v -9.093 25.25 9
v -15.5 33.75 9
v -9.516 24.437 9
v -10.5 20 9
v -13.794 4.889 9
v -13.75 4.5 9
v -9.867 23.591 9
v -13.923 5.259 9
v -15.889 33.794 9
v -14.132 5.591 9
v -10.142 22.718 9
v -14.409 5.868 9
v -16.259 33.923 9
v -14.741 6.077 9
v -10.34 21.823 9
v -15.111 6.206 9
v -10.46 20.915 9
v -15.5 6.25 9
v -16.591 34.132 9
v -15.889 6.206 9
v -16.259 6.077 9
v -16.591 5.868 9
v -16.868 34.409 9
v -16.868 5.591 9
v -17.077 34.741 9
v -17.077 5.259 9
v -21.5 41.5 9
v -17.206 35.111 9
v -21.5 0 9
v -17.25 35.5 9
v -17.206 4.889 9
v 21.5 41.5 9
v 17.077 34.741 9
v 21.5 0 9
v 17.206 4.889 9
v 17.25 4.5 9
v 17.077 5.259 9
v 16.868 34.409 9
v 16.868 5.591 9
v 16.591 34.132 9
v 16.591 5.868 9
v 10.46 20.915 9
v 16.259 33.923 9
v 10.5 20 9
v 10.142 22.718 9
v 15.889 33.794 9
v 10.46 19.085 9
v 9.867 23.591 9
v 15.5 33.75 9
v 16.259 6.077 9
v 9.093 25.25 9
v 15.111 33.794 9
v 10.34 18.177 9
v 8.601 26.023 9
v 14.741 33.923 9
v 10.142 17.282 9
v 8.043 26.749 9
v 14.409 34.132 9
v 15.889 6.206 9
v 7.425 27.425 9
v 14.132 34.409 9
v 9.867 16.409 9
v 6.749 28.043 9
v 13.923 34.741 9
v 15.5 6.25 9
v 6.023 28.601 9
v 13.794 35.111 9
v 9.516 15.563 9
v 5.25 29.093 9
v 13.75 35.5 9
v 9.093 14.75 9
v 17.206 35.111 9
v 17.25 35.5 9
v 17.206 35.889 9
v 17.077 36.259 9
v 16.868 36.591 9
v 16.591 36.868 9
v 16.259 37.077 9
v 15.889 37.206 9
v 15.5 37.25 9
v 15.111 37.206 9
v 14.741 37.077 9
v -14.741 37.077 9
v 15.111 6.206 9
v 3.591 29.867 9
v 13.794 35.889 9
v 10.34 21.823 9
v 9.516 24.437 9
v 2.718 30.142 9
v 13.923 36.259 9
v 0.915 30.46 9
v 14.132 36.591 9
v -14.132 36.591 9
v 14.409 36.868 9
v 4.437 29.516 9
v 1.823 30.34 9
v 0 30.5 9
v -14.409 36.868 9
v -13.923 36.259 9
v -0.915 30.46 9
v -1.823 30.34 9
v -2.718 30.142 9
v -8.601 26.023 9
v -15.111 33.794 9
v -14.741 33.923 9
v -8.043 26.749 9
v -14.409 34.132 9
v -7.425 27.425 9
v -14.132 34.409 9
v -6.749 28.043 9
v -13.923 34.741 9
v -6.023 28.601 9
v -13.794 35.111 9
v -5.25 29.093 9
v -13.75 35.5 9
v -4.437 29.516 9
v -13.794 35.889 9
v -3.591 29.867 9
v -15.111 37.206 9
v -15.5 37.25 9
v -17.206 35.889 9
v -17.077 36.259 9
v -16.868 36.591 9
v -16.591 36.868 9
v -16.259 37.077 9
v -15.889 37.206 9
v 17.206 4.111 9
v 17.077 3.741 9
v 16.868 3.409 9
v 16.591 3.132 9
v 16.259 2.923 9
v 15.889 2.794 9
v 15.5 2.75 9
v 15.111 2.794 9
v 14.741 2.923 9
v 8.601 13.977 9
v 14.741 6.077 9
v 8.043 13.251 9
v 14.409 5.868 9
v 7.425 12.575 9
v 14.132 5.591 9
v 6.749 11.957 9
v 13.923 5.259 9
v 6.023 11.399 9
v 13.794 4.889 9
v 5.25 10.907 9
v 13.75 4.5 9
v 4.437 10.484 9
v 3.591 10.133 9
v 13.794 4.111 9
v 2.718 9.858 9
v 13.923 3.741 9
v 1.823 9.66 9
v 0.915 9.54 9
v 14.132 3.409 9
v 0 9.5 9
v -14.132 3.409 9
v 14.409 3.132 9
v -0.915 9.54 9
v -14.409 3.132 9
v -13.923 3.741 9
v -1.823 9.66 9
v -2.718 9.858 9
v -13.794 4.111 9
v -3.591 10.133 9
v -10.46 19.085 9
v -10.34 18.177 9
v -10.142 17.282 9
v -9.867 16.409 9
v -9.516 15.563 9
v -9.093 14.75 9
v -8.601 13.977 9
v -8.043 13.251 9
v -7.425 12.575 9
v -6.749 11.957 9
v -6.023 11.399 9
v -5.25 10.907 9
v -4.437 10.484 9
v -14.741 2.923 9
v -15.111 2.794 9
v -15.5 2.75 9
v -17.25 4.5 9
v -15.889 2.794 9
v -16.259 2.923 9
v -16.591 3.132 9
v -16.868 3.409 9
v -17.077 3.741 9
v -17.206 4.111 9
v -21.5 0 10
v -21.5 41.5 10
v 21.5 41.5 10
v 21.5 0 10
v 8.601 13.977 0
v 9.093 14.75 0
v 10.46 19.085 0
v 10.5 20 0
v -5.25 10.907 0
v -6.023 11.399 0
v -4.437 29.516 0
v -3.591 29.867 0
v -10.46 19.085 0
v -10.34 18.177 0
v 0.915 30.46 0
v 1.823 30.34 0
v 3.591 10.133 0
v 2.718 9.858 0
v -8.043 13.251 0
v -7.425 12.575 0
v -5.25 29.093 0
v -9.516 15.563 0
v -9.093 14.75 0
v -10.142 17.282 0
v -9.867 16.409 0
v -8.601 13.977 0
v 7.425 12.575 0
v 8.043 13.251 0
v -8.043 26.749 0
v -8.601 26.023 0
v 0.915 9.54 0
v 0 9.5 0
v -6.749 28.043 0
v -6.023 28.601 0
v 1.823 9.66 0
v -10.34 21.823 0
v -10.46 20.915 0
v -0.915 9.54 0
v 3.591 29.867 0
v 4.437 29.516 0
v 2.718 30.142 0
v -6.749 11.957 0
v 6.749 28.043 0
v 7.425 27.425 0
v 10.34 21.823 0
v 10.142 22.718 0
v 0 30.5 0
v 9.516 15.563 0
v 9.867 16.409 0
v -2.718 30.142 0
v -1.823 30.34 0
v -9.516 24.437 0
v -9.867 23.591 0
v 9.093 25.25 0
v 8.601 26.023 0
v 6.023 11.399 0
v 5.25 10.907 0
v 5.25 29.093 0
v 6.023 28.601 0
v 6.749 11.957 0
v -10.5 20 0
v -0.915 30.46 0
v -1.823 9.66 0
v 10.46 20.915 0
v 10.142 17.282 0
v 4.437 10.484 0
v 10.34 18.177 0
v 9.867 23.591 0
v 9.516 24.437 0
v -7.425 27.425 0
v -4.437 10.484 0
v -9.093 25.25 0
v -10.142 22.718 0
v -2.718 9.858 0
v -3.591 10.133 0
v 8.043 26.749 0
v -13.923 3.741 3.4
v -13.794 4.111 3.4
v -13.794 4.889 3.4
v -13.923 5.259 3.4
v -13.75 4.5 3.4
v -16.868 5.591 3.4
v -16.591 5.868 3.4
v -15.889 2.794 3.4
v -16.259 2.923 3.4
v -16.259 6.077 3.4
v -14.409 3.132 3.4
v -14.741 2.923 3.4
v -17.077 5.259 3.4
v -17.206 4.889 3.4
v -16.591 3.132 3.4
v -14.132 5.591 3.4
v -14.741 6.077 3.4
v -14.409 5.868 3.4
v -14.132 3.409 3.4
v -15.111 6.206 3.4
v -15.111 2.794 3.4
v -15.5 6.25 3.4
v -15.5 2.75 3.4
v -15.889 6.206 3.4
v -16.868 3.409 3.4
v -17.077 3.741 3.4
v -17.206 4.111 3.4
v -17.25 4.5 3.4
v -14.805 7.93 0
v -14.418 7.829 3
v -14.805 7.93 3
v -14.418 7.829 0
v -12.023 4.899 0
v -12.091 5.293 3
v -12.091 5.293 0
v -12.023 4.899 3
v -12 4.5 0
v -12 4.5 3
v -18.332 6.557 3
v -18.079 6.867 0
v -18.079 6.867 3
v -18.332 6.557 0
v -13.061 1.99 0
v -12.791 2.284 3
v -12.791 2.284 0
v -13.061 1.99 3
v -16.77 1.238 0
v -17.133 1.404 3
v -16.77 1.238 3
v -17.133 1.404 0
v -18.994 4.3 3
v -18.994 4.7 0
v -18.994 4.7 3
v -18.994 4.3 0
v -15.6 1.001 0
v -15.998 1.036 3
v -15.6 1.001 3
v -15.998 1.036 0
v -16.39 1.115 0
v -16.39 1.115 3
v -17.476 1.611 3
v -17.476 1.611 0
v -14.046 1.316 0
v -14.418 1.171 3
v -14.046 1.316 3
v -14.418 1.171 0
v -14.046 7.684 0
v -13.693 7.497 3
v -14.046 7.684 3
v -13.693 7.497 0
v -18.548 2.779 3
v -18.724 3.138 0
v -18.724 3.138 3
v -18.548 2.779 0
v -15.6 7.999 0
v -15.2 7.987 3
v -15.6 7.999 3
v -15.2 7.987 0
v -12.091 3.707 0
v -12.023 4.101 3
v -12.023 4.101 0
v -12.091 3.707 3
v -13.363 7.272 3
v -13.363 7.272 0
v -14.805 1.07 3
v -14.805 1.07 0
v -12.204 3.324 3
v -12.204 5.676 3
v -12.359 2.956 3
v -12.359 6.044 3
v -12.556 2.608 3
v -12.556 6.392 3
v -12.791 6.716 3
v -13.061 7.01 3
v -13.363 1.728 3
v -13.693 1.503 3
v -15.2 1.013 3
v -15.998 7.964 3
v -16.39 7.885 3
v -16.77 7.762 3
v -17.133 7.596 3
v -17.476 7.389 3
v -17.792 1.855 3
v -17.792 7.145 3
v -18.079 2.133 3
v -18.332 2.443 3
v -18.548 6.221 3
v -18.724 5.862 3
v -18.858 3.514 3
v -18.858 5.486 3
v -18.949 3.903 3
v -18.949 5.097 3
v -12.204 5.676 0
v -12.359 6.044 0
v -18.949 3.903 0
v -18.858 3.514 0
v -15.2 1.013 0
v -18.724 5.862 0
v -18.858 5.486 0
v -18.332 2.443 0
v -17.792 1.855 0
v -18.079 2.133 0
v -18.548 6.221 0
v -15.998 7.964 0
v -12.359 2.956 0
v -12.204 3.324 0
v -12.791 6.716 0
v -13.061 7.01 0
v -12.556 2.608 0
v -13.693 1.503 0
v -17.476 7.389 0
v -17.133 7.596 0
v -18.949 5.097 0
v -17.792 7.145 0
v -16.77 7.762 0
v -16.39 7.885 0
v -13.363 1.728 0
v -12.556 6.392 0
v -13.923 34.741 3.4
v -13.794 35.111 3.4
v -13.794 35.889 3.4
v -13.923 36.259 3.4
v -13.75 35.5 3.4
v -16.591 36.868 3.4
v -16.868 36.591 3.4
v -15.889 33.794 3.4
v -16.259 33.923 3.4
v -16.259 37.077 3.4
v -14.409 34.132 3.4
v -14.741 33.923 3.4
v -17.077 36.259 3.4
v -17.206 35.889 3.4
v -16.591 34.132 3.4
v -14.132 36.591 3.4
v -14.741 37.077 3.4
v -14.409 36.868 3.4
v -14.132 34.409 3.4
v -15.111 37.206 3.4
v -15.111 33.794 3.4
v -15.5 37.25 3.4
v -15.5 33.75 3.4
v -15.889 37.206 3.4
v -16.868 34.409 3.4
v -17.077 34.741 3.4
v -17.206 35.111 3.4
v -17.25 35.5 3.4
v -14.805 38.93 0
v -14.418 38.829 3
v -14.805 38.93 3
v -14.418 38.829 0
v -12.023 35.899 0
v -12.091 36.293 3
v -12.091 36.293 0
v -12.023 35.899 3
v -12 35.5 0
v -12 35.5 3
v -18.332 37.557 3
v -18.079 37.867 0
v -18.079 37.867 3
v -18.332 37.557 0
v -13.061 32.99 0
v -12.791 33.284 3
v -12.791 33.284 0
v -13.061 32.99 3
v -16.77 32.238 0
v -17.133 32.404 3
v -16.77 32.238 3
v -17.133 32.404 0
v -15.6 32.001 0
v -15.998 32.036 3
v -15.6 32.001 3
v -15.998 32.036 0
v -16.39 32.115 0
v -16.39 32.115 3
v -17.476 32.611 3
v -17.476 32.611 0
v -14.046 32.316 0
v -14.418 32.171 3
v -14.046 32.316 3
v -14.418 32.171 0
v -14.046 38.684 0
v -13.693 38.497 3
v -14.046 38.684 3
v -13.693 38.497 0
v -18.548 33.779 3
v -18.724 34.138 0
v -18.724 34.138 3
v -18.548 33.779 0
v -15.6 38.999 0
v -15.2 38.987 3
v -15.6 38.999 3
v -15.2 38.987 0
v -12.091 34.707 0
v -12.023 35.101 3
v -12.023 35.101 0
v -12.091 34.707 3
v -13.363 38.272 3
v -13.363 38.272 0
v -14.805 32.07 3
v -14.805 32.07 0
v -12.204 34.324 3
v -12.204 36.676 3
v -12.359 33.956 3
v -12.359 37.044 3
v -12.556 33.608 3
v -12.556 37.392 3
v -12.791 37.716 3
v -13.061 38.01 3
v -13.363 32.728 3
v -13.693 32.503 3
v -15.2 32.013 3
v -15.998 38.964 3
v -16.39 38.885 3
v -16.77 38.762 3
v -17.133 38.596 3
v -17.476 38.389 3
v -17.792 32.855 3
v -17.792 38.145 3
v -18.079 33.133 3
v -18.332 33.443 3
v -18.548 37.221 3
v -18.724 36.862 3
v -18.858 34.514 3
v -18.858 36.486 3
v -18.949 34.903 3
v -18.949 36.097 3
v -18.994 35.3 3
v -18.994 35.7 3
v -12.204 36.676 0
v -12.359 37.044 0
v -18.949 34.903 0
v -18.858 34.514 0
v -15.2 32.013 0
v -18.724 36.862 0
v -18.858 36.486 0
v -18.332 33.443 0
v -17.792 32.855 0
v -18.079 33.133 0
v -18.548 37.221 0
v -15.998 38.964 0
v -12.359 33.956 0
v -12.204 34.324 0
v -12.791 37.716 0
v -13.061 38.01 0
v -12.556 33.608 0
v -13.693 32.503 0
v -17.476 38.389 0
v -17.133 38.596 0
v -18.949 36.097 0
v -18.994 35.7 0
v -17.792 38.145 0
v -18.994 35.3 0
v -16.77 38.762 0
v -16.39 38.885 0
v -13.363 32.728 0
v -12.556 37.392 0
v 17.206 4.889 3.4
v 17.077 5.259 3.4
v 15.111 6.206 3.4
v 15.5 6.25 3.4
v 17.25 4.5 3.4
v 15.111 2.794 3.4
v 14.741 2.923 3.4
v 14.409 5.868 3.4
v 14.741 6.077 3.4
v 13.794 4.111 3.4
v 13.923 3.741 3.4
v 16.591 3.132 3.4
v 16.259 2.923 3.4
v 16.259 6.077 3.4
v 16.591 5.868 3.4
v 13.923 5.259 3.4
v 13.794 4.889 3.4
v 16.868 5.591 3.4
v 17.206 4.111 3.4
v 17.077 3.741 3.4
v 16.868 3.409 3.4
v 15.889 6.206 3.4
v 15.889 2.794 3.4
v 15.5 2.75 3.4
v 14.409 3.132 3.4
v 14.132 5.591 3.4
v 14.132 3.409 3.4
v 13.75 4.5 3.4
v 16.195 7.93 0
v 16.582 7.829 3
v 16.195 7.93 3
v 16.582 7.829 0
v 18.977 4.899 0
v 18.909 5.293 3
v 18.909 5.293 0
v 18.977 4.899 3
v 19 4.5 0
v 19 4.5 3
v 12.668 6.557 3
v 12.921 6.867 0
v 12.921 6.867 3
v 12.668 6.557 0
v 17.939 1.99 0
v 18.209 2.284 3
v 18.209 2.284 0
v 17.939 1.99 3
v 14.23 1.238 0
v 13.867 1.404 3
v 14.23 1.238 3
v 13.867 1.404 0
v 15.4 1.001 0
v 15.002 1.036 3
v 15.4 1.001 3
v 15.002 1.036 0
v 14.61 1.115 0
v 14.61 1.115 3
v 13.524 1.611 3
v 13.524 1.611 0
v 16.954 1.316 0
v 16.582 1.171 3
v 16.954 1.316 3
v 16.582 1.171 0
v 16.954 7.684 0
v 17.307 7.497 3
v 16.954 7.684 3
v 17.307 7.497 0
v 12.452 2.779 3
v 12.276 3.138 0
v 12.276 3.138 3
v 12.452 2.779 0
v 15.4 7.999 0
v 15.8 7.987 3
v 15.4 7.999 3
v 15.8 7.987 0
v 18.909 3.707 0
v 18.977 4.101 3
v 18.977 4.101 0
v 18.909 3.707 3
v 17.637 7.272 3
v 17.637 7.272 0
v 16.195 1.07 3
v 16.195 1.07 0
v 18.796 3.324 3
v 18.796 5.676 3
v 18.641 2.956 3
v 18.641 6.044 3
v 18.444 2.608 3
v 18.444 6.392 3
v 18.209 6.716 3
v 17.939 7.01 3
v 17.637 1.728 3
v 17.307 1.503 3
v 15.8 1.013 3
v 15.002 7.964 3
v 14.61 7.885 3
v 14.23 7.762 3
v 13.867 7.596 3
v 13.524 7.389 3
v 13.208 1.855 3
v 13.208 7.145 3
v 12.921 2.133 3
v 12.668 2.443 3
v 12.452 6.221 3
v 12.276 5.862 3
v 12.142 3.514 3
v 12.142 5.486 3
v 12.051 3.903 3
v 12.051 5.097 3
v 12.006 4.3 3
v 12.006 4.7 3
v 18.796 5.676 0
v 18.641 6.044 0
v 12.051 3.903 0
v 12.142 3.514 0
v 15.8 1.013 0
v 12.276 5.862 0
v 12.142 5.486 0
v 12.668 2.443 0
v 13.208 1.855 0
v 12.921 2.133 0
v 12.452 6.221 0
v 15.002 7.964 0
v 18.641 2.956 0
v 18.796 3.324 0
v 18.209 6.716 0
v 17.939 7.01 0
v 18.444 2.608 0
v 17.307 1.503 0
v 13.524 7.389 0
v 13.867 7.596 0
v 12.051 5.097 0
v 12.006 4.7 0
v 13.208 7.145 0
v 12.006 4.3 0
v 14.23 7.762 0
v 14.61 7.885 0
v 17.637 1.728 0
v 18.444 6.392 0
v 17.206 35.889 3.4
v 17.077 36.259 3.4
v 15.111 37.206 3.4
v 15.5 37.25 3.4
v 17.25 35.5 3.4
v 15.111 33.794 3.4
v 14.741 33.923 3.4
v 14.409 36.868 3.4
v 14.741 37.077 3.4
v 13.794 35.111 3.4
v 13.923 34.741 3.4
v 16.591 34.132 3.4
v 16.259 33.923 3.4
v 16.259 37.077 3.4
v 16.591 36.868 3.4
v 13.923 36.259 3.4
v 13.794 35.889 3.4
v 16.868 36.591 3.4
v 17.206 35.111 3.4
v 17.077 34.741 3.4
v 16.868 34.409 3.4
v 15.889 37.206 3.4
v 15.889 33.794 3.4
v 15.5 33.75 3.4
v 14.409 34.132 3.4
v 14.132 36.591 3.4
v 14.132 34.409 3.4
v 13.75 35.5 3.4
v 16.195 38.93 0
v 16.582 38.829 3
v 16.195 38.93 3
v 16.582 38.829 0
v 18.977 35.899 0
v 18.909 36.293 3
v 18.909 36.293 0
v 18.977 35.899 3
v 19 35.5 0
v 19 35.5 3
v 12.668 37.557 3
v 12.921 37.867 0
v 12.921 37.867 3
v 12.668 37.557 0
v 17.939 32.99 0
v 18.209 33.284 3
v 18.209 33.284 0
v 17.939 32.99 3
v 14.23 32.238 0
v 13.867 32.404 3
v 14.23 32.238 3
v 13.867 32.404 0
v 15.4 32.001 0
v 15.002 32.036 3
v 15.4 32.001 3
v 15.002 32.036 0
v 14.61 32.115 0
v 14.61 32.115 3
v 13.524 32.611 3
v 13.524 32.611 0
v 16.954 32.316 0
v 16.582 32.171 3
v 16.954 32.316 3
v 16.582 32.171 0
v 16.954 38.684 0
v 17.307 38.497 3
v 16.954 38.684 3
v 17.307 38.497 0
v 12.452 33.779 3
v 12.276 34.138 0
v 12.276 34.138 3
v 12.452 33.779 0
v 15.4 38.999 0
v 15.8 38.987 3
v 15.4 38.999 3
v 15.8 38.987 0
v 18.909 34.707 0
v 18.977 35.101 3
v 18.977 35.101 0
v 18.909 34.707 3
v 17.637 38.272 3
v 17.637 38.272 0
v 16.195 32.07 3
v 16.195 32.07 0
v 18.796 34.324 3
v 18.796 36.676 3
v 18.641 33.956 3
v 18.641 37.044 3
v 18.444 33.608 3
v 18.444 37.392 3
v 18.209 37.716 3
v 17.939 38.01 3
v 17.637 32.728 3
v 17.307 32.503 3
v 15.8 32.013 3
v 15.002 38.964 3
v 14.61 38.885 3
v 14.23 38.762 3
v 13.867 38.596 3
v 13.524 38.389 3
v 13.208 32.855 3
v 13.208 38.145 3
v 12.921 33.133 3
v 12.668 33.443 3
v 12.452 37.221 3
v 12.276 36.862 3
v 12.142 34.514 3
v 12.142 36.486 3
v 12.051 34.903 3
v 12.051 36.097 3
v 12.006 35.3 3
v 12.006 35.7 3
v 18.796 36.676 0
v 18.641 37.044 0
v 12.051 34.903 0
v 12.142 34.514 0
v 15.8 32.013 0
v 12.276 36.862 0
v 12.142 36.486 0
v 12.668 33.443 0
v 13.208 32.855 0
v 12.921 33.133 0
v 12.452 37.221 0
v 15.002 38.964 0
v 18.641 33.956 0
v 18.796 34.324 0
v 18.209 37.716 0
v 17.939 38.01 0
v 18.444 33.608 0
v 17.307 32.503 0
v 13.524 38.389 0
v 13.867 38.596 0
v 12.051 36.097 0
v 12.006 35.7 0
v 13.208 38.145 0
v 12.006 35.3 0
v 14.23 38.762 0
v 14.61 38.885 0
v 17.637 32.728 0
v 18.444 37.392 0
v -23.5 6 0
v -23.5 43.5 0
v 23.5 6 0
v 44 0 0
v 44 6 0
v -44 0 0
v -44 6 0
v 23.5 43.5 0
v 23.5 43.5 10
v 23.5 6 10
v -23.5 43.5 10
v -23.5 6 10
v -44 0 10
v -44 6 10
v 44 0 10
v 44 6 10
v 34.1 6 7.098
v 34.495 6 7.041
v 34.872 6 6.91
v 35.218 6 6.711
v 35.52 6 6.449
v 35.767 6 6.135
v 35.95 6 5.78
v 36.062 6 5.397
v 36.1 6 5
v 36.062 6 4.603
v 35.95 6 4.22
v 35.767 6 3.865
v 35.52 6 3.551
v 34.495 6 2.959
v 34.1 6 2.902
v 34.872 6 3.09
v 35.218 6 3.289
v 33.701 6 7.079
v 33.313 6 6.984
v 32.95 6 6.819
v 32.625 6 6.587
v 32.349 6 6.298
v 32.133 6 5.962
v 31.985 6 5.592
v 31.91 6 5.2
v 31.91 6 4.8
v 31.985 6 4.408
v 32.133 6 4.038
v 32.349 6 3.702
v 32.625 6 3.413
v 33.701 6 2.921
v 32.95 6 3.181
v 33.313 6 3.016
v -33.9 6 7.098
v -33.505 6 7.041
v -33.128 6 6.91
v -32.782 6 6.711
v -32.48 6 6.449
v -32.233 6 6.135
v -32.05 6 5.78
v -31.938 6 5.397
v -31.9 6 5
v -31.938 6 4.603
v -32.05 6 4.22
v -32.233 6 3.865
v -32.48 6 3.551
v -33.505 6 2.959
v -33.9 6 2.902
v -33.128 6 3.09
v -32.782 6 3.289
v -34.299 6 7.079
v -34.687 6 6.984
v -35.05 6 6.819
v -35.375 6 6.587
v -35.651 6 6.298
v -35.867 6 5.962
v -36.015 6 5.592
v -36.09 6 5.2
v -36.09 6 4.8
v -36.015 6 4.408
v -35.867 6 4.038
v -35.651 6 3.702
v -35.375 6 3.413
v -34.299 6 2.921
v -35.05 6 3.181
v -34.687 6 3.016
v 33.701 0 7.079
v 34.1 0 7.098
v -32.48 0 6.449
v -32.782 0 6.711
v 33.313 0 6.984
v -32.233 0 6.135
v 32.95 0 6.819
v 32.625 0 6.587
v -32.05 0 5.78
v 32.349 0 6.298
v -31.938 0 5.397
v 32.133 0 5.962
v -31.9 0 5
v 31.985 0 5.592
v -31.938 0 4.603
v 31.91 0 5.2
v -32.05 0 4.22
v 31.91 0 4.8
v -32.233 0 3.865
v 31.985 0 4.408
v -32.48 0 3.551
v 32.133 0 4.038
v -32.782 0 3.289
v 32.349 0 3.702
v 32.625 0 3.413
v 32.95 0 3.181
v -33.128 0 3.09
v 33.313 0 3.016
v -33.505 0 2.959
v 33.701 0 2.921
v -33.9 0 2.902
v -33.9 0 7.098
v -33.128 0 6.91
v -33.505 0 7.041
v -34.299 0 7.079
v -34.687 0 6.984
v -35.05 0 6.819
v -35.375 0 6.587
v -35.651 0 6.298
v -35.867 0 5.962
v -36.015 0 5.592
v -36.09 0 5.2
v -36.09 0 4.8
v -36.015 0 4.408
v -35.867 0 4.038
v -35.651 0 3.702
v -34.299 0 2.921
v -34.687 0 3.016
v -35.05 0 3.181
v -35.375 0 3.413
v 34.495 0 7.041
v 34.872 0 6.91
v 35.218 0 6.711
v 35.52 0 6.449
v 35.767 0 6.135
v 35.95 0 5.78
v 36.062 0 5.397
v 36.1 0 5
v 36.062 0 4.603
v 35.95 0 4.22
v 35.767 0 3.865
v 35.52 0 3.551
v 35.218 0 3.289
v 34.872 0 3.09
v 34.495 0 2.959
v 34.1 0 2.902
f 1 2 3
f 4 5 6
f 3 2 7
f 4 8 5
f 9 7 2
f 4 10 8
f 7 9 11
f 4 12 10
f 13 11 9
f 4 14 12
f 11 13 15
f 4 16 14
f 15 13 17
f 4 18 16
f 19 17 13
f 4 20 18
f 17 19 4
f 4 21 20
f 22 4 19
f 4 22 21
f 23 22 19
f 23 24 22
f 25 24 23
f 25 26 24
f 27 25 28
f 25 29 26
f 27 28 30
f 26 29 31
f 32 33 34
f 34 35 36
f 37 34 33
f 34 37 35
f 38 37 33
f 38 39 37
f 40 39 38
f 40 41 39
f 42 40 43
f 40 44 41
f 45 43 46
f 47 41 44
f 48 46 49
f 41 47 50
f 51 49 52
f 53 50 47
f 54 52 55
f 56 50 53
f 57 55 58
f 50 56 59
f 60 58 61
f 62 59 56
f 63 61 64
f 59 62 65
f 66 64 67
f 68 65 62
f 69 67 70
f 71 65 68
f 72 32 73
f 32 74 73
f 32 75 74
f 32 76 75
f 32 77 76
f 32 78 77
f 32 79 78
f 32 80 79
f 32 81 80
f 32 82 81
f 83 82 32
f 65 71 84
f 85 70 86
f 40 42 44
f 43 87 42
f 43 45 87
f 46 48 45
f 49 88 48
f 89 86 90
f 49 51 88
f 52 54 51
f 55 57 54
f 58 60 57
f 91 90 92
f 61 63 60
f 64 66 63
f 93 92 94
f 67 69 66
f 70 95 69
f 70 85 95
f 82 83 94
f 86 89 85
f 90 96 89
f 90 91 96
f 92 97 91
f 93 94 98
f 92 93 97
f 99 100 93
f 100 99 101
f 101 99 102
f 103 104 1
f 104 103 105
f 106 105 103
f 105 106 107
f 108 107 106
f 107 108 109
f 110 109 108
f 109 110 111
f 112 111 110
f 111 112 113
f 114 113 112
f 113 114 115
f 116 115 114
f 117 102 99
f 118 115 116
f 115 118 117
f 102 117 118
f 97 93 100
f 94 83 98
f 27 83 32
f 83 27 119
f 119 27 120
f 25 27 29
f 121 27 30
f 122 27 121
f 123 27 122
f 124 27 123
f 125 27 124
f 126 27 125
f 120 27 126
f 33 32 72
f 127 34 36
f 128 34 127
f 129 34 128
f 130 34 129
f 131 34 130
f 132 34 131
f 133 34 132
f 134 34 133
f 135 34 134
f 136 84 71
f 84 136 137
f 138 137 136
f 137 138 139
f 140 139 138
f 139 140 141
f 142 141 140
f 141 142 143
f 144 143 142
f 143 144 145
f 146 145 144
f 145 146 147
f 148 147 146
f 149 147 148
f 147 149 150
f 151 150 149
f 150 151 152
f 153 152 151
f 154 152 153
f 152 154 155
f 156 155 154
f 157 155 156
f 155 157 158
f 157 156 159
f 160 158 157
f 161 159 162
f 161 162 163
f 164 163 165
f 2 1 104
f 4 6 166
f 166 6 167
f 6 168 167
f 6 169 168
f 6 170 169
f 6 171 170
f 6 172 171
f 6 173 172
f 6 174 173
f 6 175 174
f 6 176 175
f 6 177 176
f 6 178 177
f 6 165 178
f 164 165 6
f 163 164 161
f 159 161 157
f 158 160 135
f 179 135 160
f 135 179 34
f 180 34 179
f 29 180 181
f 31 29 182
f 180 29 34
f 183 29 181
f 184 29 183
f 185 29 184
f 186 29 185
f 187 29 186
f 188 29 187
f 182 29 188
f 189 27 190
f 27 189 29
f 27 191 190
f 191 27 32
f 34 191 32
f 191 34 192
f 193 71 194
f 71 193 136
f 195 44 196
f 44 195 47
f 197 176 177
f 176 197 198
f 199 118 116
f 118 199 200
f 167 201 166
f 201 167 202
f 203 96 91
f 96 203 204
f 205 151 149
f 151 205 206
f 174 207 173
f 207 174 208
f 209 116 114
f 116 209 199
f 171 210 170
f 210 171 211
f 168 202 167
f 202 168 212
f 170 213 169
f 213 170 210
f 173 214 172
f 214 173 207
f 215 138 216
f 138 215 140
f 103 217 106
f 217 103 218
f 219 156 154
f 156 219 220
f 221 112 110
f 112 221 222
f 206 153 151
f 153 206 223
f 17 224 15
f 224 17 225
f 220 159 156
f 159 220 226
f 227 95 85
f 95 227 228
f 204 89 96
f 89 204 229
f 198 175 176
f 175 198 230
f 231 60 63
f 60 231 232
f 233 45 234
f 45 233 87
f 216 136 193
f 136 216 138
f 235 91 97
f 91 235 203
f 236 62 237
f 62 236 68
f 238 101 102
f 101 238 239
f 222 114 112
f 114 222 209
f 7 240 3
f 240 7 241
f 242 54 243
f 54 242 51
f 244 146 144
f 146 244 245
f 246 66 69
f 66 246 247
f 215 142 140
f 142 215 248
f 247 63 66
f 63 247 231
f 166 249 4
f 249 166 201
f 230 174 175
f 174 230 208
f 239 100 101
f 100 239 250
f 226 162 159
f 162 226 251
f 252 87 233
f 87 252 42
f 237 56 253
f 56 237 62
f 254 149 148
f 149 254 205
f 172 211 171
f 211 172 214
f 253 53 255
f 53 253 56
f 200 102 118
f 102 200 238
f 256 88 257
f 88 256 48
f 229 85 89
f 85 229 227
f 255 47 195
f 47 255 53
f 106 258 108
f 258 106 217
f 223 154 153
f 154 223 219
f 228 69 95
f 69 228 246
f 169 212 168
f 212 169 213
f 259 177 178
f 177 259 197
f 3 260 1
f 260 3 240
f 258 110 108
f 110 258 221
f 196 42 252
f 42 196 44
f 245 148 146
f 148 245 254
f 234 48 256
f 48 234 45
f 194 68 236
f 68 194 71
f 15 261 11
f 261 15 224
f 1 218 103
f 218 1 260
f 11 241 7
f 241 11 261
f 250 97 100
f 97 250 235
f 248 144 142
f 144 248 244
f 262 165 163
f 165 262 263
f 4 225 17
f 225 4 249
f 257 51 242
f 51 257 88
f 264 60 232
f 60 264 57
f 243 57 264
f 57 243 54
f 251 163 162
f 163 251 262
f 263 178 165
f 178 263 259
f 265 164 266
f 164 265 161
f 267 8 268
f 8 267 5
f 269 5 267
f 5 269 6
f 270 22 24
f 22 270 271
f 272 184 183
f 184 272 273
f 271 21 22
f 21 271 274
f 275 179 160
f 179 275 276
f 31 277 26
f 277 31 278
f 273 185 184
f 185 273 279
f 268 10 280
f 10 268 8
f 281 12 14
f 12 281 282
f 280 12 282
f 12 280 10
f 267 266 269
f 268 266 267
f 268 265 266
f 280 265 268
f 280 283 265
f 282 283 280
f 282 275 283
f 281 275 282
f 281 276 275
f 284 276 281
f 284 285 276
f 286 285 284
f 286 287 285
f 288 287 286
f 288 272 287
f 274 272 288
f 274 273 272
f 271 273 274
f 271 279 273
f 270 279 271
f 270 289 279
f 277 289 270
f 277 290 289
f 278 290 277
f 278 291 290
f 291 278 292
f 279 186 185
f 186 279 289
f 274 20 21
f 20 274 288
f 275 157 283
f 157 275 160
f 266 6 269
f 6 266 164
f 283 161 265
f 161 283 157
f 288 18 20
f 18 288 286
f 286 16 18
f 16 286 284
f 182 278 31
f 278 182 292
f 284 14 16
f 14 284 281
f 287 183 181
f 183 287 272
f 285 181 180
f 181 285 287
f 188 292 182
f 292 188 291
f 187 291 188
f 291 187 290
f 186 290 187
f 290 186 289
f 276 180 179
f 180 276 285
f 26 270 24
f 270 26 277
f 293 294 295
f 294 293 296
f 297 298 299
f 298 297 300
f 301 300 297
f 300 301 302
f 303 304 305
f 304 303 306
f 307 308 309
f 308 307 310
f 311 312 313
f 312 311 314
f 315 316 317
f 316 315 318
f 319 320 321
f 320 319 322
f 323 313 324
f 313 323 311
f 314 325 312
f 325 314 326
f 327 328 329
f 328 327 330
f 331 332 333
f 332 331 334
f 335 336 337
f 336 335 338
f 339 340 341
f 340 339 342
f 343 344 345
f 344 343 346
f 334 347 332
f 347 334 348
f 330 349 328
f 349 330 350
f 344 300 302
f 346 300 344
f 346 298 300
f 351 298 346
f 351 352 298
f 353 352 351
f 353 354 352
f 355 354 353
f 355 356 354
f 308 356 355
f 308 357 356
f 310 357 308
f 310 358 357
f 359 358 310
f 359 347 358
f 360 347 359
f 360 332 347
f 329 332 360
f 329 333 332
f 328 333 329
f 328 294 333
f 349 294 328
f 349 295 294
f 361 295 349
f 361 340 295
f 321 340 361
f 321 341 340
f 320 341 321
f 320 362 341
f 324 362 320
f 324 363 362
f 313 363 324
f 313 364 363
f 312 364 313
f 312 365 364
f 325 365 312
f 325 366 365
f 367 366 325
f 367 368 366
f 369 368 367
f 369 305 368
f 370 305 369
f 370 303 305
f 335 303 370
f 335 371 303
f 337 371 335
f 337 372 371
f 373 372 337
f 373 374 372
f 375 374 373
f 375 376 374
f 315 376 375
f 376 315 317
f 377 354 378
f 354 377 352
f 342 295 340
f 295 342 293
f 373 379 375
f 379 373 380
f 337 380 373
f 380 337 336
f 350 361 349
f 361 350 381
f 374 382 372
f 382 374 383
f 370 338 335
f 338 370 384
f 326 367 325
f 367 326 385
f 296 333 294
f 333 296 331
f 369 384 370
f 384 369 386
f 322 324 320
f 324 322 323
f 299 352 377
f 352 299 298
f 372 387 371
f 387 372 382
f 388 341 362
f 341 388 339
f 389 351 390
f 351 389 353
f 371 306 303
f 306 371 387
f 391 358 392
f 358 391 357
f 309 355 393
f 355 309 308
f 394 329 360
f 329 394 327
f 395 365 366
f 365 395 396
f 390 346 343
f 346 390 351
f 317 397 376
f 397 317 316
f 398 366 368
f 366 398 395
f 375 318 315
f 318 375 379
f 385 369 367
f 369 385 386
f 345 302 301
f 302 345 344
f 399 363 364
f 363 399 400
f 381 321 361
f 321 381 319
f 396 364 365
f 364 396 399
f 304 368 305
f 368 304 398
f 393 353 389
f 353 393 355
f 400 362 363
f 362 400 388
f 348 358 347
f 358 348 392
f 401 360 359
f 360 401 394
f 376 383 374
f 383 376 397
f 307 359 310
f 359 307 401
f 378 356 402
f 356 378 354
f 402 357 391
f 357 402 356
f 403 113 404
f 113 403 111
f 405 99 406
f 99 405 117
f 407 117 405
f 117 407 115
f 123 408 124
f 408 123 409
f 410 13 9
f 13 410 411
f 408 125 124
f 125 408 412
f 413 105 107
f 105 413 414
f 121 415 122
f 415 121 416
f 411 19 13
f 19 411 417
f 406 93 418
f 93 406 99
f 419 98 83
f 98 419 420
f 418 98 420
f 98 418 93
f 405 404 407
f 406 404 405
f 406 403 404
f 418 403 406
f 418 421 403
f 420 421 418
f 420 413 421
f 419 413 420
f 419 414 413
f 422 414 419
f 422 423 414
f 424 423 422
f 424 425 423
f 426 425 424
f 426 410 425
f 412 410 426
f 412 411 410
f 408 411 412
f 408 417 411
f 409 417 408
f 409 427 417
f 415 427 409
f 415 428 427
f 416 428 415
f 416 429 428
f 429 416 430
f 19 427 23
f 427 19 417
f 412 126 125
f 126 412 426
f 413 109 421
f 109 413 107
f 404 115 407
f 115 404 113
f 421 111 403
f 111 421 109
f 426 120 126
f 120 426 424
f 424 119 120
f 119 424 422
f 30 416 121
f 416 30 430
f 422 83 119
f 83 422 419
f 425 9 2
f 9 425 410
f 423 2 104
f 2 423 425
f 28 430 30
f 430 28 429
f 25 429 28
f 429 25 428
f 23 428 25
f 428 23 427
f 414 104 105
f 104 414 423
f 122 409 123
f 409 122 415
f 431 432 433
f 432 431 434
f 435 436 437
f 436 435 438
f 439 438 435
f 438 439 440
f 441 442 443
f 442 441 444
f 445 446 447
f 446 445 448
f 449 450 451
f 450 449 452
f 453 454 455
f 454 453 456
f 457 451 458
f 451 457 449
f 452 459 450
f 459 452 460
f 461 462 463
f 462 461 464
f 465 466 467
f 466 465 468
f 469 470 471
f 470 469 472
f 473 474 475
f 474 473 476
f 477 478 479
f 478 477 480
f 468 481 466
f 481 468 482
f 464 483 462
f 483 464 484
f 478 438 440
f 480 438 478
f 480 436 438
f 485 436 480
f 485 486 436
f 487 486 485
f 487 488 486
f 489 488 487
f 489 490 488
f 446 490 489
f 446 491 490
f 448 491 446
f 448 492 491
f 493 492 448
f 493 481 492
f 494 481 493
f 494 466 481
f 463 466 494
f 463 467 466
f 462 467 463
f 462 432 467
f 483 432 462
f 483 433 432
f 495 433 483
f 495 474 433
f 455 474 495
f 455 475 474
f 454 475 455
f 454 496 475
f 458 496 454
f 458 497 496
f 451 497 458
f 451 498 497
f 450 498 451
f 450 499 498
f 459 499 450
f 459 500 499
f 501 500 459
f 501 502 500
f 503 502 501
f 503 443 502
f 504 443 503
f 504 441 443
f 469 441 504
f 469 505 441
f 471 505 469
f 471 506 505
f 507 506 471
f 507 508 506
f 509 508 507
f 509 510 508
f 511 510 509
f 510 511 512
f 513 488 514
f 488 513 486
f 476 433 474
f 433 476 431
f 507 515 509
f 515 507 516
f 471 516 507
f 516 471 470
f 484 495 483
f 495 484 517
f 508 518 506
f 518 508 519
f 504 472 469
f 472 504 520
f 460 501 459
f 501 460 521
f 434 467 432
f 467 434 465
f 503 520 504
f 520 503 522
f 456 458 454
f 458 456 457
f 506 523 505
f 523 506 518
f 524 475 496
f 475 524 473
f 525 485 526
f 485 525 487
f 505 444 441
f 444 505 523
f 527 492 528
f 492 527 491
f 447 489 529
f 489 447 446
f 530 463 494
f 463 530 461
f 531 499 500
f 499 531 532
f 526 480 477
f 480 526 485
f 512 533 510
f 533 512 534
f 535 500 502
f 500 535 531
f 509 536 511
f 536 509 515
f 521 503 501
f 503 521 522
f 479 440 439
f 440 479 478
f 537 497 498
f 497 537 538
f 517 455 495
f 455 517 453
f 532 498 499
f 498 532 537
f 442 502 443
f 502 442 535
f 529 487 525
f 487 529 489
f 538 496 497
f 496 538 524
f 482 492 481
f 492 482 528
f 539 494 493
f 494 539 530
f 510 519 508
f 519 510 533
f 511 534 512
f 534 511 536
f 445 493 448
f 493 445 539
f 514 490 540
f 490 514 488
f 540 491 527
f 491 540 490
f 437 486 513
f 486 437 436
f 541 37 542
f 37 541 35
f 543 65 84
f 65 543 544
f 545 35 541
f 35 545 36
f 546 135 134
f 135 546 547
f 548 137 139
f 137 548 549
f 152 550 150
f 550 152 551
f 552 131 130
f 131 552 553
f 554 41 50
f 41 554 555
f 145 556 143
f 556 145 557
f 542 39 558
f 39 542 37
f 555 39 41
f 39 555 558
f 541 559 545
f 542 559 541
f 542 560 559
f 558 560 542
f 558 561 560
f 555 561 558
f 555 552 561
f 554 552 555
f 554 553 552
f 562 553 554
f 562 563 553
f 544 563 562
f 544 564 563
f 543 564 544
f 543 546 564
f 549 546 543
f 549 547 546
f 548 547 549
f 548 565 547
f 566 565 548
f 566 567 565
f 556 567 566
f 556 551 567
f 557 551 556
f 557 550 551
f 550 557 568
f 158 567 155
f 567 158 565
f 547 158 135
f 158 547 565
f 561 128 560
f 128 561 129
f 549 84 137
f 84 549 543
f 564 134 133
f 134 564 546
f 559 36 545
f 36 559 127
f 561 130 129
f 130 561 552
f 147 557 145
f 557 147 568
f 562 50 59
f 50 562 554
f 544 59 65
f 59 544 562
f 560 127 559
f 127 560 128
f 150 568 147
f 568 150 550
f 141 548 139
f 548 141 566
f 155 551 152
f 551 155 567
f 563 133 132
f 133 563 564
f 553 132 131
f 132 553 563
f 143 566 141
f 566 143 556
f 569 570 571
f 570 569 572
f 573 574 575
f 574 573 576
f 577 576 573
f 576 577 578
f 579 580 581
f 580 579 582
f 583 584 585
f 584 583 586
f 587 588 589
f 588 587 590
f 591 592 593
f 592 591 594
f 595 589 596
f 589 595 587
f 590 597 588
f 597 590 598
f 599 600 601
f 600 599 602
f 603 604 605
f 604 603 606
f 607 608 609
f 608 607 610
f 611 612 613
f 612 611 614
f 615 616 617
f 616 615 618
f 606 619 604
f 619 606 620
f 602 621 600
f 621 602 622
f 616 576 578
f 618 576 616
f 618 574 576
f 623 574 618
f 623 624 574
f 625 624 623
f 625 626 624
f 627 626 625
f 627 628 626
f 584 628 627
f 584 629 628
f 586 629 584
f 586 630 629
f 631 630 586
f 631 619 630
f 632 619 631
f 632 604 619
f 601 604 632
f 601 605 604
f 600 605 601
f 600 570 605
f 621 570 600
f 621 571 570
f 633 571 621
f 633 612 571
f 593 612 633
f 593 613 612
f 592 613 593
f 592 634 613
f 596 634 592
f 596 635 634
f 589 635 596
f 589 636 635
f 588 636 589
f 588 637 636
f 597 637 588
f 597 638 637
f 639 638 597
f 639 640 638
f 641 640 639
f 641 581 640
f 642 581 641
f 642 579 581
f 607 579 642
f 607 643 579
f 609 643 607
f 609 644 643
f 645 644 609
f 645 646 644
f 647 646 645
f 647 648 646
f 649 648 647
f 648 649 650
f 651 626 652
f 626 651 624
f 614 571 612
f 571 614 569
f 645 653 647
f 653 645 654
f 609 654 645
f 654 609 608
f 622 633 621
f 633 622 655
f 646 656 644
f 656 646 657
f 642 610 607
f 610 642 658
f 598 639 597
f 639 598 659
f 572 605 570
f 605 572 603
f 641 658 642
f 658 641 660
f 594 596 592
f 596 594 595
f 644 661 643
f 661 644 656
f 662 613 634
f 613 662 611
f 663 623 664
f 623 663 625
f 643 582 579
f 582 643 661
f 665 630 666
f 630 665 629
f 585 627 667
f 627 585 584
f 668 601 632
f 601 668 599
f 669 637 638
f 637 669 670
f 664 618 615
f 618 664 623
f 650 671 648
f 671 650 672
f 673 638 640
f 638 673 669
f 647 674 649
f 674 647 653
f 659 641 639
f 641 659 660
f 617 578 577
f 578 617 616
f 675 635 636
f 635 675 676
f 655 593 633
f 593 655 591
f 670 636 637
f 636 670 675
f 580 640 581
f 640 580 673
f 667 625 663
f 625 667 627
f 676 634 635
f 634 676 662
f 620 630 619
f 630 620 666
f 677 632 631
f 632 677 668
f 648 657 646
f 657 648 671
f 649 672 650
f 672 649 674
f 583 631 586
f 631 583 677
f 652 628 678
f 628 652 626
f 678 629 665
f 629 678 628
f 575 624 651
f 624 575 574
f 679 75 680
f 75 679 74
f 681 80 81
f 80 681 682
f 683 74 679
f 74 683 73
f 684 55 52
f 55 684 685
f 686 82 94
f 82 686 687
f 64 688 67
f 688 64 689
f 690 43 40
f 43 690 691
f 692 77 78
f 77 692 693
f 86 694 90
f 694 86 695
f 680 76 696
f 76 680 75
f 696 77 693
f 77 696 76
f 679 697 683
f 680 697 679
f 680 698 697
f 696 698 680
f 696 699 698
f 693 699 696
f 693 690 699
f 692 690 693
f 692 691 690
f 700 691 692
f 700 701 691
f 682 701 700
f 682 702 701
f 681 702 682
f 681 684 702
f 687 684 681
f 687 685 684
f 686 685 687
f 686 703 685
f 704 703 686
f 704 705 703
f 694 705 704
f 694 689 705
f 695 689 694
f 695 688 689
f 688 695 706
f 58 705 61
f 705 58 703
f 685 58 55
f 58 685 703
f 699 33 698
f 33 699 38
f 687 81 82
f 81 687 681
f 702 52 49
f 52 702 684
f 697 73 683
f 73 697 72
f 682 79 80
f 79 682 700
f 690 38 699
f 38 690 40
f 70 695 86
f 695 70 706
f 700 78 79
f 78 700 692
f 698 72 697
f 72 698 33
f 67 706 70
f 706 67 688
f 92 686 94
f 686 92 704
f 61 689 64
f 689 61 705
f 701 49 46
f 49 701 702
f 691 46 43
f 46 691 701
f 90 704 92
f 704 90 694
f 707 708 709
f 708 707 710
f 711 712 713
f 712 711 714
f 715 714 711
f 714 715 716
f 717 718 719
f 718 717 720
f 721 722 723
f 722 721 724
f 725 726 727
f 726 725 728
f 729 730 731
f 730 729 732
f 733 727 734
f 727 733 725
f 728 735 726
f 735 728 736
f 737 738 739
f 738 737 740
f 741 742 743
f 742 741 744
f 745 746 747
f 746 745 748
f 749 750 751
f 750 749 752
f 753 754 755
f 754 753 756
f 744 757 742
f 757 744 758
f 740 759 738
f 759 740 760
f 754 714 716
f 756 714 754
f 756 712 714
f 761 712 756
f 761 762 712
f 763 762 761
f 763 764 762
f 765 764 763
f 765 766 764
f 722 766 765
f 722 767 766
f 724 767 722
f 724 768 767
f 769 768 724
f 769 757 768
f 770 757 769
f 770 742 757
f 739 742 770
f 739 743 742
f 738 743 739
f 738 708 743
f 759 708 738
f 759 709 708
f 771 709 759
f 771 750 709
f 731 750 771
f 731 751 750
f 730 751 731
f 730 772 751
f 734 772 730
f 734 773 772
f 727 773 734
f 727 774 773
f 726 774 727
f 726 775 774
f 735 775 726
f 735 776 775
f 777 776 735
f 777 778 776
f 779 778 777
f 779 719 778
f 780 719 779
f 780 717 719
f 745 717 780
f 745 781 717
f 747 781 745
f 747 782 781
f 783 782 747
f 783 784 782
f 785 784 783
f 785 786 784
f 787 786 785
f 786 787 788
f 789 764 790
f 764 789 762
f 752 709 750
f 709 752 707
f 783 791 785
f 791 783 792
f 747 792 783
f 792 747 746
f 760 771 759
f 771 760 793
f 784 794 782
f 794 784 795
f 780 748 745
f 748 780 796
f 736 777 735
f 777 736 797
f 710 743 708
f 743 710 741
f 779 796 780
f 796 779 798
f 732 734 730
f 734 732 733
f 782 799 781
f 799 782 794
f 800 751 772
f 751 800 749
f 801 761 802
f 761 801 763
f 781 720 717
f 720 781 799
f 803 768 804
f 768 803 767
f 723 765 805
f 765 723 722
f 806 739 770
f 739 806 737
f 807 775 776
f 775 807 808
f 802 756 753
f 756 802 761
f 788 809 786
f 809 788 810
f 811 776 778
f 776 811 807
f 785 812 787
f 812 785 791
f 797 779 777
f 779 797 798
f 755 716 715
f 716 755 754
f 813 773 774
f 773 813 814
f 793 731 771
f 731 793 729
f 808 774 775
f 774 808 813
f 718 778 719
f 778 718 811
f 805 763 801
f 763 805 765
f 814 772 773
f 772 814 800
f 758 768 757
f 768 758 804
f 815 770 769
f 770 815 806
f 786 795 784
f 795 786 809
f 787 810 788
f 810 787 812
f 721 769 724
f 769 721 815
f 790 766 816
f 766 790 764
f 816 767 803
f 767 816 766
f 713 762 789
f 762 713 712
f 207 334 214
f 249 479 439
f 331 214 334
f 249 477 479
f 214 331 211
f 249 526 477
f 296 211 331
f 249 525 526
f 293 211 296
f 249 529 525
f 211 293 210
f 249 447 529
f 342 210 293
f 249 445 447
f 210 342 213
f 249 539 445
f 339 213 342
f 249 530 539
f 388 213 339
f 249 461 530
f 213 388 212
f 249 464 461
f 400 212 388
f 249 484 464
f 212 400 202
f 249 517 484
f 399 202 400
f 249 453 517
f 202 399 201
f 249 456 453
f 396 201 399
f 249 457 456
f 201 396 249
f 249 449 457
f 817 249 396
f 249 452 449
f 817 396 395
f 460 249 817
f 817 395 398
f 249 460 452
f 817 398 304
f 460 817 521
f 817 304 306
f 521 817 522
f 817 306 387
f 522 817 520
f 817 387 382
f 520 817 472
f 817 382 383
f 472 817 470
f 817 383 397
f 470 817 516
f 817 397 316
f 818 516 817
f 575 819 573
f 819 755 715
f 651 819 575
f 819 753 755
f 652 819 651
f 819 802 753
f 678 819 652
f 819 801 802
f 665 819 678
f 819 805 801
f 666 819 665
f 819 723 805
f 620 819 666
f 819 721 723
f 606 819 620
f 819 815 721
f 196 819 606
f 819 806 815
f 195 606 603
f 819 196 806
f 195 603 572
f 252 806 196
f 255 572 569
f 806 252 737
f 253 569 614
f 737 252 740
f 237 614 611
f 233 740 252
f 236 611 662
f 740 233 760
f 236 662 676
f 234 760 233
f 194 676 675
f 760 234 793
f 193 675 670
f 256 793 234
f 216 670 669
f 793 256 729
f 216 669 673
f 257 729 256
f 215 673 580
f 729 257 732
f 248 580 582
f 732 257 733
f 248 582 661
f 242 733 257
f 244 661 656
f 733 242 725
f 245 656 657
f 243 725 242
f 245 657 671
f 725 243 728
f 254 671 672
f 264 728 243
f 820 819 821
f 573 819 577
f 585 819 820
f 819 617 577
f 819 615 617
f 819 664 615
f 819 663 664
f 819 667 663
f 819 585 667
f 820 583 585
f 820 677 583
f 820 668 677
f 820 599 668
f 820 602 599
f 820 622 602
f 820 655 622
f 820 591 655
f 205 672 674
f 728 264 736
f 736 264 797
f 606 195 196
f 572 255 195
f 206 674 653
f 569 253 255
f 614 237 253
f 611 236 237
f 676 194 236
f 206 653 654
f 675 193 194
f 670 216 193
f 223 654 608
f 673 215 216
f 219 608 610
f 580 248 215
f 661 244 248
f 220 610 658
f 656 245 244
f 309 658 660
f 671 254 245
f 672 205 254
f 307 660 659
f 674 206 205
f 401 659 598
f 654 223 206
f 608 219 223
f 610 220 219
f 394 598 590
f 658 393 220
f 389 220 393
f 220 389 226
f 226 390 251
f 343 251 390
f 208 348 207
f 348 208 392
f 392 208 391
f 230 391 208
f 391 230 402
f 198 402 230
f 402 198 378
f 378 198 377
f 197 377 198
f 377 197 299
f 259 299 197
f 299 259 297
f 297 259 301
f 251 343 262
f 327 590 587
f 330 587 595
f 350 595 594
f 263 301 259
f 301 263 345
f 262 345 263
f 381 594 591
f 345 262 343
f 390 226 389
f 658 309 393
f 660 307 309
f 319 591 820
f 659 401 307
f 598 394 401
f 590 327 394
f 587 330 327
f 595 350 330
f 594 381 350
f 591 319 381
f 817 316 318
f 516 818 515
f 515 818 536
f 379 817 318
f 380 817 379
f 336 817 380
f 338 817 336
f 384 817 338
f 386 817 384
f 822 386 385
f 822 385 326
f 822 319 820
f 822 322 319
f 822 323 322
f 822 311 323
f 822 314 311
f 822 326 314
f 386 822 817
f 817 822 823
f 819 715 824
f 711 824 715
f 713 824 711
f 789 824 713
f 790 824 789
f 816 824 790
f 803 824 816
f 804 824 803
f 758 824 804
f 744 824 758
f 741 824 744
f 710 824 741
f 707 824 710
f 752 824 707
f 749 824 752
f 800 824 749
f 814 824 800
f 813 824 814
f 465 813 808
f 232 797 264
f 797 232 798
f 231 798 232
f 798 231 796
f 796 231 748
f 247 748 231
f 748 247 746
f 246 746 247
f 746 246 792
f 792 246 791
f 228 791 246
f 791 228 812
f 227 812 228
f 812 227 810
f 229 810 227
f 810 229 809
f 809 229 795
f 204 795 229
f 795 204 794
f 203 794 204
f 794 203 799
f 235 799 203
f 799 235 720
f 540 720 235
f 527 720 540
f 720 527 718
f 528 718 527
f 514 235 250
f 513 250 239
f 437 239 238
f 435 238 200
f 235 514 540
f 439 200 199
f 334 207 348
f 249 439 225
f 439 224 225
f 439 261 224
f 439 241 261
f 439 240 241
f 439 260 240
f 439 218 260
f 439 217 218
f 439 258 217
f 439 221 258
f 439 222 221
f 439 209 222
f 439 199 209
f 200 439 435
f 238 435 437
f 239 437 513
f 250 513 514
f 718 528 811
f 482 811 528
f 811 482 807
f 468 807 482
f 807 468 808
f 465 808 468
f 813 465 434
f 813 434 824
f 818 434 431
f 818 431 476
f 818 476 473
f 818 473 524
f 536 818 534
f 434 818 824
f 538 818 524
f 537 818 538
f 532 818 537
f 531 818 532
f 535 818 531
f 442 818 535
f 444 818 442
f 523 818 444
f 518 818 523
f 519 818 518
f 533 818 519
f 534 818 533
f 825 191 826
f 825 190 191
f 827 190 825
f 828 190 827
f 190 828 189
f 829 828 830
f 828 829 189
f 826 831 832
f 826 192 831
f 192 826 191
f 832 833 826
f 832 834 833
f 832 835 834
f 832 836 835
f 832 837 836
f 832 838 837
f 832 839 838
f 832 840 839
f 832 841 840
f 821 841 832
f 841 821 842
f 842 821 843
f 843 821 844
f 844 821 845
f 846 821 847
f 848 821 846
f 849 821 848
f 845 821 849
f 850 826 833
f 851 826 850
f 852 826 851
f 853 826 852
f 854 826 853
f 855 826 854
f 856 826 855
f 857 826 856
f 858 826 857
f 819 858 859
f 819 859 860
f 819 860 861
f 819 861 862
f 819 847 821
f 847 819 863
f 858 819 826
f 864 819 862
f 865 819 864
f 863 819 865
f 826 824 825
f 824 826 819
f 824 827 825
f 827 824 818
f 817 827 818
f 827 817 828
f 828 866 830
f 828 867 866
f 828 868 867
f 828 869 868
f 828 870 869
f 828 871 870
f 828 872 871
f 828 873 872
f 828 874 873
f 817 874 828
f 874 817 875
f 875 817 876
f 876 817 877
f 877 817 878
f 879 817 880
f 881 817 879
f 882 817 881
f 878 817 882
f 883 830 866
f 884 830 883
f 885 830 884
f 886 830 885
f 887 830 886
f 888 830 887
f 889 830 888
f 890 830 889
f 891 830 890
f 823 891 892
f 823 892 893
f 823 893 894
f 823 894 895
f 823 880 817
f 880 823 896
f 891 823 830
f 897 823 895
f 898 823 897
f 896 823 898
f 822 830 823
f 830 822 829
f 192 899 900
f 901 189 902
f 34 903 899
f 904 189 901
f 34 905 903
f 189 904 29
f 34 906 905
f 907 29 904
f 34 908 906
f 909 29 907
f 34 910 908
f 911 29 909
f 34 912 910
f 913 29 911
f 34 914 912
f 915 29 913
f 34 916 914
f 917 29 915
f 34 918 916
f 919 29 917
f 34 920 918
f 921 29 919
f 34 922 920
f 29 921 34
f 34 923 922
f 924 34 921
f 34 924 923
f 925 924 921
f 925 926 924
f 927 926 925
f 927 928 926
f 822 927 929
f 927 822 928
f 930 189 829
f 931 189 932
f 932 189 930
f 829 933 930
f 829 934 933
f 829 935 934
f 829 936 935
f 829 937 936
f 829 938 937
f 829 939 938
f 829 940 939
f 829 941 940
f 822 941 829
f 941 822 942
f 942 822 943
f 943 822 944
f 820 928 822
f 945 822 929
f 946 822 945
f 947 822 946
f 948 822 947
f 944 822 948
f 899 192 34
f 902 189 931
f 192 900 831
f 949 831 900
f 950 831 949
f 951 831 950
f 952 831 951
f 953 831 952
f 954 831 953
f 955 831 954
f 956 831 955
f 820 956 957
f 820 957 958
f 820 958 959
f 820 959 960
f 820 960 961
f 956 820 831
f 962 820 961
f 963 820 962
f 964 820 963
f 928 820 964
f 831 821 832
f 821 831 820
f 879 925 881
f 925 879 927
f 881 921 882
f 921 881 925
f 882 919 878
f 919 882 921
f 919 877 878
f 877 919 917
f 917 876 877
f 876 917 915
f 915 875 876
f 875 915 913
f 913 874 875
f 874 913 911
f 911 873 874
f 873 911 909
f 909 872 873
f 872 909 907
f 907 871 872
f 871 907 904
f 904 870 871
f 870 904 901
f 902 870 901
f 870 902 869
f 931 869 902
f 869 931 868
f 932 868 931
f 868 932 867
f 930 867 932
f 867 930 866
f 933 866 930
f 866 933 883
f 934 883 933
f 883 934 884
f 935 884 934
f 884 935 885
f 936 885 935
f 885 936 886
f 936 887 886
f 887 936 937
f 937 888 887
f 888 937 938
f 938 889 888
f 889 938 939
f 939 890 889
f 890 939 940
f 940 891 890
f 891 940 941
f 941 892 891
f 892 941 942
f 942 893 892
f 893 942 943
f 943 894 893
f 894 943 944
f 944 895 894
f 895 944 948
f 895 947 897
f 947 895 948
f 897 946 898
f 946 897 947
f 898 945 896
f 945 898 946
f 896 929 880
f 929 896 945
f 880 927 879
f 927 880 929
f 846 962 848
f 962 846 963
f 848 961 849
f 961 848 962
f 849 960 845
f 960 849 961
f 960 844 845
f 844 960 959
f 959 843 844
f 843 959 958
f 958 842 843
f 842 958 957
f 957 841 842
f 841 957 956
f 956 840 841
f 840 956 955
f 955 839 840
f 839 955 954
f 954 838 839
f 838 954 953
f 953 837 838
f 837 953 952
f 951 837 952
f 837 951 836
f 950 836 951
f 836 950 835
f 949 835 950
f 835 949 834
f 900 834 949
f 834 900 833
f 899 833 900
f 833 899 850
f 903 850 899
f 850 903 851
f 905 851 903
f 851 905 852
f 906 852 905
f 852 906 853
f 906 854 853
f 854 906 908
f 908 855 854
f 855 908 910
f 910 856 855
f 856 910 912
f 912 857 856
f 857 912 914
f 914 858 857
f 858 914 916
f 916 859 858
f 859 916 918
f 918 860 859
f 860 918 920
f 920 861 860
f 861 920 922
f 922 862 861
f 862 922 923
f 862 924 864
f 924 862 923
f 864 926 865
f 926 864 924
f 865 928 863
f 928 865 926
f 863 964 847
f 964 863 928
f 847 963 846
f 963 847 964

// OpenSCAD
//$fn=60;
$fa=5;
$fs=.4;


difference(){
    body_all();
    motor_hole();
    motor_mounting_holes();
    mounting_holes();
}

module body_all(){
    linear_extrude(height=10){
        translate([0,3,0]) square([88,6],center=true);
        translate([0,43.5/2,0]) square([47,43.5],center=true);
    }
}

module motor_hole(){
    translate([0,20,9]) linear_extrude(height=4) square([43,43],center=true);
    translate([0,20,-1]) linear_extrude(height=12) circle(d=21);
}

module motor_mounting_holes(){
    motor_mounting_hole(-31/2,20-31/2);
    motor_mounting_hole(-31/2,20+31/2);
    motor_mounting_hole(31/2,20-31/2);
    motor_mounting_hole(31/2,20+31/2);
}

module motor_mounting_hole(x=0,y=0){
    translate([x,y,3.4]) linear_extrude(height=12) circle(d=3.5);
    translate([x,y,-1]) linear_extrude(height=4) circle(d=7);
}


module mounting_holes(){
    translate([0,10,5]) rotate([90,0,0]) linear_extrude(height=20){
        translate([-34,0,0]) circle(d=4.2);
        translate([34,0,0]) circle(d=4.2);
    }
}
